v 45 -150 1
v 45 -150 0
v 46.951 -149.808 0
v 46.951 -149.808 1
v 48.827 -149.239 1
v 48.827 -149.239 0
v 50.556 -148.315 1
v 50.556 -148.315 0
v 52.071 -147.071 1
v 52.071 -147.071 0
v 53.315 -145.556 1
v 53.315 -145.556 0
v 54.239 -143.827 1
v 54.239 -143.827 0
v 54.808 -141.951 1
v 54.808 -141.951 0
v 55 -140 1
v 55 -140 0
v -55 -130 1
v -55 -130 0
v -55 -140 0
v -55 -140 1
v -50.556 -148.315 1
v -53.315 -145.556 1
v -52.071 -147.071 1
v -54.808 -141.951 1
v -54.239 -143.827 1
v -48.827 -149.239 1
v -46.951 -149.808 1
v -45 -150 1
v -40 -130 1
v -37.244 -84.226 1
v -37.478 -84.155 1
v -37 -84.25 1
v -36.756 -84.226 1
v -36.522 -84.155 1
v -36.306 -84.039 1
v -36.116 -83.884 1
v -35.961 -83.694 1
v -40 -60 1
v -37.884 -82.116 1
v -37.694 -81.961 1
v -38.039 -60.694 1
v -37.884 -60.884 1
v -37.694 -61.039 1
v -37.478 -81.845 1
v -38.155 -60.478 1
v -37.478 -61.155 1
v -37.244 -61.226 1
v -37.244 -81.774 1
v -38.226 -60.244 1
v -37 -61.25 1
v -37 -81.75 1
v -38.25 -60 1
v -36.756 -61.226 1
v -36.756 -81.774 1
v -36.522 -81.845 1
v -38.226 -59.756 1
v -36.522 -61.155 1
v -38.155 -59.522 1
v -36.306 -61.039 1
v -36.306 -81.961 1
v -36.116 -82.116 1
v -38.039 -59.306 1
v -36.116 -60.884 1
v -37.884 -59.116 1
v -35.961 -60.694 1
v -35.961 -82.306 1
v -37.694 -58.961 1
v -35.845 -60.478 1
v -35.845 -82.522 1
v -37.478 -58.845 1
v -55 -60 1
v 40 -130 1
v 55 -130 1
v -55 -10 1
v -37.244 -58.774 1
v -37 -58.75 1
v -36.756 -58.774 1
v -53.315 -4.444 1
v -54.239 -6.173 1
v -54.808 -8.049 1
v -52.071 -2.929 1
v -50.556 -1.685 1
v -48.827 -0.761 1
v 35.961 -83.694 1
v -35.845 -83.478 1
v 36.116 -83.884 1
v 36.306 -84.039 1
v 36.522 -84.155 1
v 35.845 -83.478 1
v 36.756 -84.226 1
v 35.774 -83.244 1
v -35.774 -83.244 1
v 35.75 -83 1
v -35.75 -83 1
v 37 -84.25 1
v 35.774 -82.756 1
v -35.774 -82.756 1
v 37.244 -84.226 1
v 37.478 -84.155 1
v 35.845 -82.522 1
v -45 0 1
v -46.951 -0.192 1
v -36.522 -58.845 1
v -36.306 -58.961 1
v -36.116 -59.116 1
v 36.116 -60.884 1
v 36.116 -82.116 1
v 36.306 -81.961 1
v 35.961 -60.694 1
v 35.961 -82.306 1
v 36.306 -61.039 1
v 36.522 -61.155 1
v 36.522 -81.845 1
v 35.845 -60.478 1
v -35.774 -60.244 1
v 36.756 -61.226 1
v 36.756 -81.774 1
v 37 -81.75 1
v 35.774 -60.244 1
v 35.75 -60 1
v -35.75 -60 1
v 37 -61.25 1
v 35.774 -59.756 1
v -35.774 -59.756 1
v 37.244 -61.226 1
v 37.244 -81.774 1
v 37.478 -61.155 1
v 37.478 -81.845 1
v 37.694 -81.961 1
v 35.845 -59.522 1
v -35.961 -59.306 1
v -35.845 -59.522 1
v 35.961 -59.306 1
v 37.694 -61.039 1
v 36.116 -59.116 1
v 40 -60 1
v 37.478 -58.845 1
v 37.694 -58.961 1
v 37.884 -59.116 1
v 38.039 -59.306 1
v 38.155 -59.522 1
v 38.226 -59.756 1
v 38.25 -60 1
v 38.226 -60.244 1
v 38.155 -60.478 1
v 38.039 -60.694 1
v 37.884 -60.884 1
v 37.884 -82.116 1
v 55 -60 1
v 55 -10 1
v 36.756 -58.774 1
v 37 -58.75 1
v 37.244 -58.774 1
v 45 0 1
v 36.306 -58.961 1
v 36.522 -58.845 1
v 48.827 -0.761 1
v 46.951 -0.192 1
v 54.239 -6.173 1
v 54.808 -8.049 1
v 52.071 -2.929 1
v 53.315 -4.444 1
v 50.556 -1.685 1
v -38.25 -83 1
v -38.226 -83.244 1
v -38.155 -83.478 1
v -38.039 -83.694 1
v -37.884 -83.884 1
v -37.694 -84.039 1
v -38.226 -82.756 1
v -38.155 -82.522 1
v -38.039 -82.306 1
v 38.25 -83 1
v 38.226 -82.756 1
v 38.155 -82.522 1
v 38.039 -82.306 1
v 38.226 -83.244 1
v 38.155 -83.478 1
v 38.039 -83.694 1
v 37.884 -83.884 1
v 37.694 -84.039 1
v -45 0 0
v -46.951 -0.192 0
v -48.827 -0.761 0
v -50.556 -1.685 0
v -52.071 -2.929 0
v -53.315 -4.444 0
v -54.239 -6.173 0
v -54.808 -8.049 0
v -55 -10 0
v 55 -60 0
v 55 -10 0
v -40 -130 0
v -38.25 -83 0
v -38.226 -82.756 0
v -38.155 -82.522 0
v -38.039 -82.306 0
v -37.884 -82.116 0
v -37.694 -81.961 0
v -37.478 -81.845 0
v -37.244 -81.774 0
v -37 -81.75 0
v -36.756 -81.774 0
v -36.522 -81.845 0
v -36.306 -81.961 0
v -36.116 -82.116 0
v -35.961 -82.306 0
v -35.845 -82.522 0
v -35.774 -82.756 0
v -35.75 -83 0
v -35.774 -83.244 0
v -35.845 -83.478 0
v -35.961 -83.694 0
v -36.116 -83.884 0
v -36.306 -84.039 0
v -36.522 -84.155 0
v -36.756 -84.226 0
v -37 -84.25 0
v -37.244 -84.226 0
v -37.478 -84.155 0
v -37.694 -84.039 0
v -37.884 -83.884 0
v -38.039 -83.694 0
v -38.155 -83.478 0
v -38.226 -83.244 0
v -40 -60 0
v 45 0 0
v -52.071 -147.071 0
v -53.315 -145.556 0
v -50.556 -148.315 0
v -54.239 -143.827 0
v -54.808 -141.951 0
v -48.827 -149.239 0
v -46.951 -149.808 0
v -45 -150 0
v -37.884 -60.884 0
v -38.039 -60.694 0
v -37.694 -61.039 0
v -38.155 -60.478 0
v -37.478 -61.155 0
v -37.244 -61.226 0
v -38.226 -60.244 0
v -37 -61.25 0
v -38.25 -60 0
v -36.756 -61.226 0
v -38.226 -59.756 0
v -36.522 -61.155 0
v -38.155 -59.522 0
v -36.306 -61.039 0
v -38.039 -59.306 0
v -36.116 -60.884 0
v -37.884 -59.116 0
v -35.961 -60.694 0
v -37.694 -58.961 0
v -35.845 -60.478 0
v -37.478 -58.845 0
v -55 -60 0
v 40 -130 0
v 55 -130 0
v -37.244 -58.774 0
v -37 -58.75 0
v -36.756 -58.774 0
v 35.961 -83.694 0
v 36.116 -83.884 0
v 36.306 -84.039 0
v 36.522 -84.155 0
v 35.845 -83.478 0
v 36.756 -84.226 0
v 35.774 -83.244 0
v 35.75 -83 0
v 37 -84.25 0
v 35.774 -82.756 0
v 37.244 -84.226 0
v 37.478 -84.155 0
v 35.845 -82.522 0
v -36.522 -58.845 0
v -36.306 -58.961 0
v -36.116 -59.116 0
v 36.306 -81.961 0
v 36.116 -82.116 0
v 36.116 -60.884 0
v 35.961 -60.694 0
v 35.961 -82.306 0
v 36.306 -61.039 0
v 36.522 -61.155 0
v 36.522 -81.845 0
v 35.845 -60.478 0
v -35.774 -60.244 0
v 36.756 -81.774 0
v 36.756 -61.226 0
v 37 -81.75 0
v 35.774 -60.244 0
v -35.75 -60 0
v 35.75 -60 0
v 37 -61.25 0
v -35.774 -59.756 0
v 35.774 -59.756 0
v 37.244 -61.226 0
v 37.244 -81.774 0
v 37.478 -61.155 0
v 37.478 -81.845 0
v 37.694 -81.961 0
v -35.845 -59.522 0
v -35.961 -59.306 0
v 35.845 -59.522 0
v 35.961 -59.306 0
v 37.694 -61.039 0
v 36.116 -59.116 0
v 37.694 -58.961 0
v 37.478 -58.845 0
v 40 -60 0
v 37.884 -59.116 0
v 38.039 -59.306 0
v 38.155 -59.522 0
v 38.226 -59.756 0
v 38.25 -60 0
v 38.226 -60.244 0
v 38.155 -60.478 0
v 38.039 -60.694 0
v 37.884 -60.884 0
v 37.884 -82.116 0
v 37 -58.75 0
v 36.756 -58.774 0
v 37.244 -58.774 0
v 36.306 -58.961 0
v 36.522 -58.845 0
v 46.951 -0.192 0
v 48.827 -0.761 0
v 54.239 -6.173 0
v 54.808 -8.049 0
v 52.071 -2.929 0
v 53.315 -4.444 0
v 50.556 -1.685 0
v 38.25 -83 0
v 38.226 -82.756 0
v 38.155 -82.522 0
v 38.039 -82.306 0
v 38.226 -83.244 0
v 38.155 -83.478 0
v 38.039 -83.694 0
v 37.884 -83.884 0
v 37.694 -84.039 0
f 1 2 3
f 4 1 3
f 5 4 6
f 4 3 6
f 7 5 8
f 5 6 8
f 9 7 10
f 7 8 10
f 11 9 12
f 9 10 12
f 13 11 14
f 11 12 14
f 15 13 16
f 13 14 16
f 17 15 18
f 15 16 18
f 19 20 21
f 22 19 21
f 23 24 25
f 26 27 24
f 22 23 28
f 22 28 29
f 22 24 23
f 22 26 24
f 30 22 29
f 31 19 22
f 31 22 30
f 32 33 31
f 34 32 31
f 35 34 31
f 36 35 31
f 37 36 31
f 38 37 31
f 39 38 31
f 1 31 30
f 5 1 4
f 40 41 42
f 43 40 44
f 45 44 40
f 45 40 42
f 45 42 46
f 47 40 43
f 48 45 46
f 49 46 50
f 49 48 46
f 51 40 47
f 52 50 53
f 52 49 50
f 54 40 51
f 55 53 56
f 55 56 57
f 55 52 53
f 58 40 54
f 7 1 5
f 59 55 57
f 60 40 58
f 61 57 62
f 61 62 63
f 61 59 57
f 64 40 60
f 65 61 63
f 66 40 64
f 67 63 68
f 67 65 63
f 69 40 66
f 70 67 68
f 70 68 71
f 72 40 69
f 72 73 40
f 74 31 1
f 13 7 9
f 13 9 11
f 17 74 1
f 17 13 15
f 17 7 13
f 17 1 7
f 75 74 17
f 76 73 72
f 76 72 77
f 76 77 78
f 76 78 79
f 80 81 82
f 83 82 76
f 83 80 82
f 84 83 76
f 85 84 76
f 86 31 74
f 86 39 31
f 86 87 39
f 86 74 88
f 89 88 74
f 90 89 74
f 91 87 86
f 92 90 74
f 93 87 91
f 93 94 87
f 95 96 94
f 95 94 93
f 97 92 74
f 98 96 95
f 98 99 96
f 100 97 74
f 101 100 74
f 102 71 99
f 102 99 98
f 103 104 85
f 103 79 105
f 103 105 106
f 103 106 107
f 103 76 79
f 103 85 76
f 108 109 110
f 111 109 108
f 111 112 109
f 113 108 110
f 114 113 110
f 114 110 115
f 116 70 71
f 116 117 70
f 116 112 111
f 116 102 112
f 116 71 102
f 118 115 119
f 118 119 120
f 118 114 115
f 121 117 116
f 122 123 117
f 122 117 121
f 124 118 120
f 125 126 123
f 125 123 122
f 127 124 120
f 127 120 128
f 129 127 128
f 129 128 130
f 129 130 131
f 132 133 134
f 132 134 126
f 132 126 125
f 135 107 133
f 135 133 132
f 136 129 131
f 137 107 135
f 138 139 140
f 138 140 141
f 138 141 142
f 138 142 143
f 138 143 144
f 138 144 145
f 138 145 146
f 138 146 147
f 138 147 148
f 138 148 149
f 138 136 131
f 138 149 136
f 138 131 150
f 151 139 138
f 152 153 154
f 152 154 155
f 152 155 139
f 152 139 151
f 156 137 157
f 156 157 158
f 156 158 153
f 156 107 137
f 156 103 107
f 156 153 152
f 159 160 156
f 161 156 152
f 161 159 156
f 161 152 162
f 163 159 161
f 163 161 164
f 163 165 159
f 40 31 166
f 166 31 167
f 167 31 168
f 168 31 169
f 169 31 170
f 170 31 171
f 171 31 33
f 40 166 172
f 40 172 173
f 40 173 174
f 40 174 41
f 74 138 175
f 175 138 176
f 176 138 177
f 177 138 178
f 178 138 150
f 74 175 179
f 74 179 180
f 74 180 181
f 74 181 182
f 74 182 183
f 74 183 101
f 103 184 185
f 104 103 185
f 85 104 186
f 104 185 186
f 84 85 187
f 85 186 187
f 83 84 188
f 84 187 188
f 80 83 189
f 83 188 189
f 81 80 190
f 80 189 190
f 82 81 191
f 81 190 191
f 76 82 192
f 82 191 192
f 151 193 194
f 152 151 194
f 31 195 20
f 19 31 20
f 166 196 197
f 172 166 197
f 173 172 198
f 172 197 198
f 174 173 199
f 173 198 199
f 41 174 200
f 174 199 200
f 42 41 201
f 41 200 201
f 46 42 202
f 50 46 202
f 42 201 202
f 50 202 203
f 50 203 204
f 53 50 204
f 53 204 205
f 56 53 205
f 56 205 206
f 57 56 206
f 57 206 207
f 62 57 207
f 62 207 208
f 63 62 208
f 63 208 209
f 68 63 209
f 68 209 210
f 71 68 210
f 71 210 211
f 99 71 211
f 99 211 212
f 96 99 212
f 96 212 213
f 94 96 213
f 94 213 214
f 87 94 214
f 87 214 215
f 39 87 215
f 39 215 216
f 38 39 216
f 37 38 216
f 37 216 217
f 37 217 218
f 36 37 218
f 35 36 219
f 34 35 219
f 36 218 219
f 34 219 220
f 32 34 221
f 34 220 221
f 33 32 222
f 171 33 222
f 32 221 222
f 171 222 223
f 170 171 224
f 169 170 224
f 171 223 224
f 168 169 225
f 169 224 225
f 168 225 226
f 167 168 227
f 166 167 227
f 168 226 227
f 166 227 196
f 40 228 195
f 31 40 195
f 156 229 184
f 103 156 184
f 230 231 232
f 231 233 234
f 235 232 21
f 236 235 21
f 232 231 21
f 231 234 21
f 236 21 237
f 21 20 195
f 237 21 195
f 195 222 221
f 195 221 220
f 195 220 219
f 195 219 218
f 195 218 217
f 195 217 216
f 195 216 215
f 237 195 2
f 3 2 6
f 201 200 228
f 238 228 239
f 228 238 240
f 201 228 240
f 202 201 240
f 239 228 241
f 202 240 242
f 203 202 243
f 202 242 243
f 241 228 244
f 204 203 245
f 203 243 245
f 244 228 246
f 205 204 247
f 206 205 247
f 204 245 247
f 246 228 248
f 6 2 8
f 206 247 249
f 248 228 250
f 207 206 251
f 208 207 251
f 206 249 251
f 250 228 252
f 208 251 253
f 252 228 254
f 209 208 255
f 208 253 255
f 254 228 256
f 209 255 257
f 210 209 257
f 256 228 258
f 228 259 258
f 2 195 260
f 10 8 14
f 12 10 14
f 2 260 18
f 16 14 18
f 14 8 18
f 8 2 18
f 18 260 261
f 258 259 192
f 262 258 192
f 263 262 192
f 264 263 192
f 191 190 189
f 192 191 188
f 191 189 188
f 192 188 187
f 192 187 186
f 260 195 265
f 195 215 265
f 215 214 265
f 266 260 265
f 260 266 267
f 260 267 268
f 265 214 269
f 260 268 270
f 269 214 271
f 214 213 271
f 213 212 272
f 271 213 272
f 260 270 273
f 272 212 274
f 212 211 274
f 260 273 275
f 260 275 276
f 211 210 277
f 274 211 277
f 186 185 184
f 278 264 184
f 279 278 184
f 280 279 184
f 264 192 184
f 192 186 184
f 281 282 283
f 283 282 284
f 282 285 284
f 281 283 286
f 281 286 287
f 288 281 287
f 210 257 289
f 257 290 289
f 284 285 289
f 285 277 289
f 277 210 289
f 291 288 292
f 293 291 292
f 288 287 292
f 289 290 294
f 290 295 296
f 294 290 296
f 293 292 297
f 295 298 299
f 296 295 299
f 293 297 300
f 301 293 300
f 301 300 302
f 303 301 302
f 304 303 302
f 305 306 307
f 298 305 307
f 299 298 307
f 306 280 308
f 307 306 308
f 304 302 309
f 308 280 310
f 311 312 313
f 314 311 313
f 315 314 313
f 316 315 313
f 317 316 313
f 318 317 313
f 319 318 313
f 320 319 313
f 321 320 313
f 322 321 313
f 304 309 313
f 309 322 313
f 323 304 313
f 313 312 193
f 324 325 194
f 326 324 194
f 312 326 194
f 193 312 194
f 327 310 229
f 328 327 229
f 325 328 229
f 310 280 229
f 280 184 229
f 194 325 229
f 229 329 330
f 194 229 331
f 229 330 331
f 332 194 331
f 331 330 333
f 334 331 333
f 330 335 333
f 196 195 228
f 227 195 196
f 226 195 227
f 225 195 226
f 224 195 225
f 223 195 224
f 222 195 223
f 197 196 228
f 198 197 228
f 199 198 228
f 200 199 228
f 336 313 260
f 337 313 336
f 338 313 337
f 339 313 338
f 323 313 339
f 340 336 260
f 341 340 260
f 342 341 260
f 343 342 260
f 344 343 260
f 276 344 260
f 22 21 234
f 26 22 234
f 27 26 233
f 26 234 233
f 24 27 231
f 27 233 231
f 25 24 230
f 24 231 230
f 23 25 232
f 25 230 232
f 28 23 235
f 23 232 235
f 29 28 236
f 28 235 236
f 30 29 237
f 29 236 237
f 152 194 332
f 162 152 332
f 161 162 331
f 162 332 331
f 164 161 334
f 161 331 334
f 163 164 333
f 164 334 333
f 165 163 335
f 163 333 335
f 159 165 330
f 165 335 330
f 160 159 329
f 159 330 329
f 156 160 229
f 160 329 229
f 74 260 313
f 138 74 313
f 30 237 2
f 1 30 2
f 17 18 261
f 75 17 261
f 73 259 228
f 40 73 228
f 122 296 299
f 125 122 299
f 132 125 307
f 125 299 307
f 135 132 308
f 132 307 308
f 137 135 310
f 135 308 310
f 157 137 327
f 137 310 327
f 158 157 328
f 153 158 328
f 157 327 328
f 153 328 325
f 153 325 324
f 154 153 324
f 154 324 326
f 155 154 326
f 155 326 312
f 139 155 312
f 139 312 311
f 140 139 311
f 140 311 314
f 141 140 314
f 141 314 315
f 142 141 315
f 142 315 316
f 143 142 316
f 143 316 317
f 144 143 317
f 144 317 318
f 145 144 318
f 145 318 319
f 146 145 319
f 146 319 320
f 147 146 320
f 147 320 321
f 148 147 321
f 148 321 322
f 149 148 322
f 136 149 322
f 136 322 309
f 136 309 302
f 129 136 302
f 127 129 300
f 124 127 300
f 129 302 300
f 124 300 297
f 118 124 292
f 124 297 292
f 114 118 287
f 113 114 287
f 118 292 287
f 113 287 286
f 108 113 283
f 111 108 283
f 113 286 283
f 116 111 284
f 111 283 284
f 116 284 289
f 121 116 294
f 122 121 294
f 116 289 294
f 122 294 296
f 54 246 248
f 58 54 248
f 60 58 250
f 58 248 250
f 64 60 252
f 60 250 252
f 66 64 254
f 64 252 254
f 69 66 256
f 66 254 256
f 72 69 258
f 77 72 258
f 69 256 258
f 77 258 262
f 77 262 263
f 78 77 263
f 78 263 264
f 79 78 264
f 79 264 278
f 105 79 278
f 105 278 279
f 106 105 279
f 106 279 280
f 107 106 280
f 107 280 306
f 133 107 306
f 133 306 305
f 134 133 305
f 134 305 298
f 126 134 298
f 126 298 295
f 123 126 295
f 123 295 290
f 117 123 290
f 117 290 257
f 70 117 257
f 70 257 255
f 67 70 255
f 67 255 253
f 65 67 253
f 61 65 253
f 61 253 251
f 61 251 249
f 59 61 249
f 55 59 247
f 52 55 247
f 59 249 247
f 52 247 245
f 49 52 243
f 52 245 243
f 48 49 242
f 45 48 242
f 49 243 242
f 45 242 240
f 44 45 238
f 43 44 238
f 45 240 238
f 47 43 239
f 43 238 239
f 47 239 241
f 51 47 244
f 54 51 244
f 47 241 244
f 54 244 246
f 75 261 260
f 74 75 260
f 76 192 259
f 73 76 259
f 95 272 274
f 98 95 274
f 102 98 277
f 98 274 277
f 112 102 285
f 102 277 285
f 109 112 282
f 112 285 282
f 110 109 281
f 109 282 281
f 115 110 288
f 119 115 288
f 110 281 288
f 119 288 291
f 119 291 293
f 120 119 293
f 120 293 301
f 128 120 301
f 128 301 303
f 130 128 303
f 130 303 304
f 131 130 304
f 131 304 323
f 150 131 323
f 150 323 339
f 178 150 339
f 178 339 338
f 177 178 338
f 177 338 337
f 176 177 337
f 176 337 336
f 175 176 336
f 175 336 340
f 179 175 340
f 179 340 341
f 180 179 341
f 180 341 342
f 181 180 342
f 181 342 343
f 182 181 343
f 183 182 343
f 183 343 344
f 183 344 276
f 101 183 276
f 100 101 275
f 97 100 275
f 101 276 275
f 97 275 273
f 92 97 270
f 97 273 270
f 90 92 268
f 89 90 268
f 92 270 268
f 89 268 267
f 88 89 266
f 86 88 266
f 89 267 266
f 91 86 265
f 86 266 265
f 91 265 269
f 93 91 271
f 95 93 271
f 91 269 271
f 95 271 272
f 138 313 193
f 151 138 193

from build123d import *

# Parameters (mm, degrees)
F1_DEPTH = 1
F3_D     = 2.5


# Not quite as in the source:
# - a feature names something its author has since deleted; it is built from what else it names


with BuildPart() as f1:
    # F0 (on Top) → F1 (new body)
    with BuildSketch(Plane.XY):
        with BuildLine():
            Line((45, 0), (-45, 0))
            ThreePointArc((-45, 0), (-52.0710678119, -2.9289321881), (-55, -10))
            Line((-55, -10), (-55, -60))
            Line((-55, -60), (-40, -60))
            Line((-40, -60), (-40, -130))
            Line((-40, -130), (-55, -130))
            Line((-55, -130), (-55, -140))
            ThreePointArc((-55, -140), (-52.0710678119, -147.0710678119), (-45, -150))
            Line((-45, -150), (45, -150))
            ThreePointArc((45, -150), (52.0710678119, -147.0710678119), (55, -140))
            Line((55, -140), (55, -130))
            Line((55, -130), (40, -130))
            Line((40, -130), (40, -60))
            Line((40, -60), (55, -60))
            Line((55, -60), (55, -10))
            ThreePointArc((55, -10), (52.0710678119, -2.9289321881), (45, 0))
        make_face()
    extrude(amount=F1_DEPTH)

    # F3 (through all)
    with Locations(Plane.XY.offset(1)):
        with Locations((37, -60), (37, -83), (-37, -60), (-37, -83)):
            Hole(F3_D / 2)


solid = f1.part
